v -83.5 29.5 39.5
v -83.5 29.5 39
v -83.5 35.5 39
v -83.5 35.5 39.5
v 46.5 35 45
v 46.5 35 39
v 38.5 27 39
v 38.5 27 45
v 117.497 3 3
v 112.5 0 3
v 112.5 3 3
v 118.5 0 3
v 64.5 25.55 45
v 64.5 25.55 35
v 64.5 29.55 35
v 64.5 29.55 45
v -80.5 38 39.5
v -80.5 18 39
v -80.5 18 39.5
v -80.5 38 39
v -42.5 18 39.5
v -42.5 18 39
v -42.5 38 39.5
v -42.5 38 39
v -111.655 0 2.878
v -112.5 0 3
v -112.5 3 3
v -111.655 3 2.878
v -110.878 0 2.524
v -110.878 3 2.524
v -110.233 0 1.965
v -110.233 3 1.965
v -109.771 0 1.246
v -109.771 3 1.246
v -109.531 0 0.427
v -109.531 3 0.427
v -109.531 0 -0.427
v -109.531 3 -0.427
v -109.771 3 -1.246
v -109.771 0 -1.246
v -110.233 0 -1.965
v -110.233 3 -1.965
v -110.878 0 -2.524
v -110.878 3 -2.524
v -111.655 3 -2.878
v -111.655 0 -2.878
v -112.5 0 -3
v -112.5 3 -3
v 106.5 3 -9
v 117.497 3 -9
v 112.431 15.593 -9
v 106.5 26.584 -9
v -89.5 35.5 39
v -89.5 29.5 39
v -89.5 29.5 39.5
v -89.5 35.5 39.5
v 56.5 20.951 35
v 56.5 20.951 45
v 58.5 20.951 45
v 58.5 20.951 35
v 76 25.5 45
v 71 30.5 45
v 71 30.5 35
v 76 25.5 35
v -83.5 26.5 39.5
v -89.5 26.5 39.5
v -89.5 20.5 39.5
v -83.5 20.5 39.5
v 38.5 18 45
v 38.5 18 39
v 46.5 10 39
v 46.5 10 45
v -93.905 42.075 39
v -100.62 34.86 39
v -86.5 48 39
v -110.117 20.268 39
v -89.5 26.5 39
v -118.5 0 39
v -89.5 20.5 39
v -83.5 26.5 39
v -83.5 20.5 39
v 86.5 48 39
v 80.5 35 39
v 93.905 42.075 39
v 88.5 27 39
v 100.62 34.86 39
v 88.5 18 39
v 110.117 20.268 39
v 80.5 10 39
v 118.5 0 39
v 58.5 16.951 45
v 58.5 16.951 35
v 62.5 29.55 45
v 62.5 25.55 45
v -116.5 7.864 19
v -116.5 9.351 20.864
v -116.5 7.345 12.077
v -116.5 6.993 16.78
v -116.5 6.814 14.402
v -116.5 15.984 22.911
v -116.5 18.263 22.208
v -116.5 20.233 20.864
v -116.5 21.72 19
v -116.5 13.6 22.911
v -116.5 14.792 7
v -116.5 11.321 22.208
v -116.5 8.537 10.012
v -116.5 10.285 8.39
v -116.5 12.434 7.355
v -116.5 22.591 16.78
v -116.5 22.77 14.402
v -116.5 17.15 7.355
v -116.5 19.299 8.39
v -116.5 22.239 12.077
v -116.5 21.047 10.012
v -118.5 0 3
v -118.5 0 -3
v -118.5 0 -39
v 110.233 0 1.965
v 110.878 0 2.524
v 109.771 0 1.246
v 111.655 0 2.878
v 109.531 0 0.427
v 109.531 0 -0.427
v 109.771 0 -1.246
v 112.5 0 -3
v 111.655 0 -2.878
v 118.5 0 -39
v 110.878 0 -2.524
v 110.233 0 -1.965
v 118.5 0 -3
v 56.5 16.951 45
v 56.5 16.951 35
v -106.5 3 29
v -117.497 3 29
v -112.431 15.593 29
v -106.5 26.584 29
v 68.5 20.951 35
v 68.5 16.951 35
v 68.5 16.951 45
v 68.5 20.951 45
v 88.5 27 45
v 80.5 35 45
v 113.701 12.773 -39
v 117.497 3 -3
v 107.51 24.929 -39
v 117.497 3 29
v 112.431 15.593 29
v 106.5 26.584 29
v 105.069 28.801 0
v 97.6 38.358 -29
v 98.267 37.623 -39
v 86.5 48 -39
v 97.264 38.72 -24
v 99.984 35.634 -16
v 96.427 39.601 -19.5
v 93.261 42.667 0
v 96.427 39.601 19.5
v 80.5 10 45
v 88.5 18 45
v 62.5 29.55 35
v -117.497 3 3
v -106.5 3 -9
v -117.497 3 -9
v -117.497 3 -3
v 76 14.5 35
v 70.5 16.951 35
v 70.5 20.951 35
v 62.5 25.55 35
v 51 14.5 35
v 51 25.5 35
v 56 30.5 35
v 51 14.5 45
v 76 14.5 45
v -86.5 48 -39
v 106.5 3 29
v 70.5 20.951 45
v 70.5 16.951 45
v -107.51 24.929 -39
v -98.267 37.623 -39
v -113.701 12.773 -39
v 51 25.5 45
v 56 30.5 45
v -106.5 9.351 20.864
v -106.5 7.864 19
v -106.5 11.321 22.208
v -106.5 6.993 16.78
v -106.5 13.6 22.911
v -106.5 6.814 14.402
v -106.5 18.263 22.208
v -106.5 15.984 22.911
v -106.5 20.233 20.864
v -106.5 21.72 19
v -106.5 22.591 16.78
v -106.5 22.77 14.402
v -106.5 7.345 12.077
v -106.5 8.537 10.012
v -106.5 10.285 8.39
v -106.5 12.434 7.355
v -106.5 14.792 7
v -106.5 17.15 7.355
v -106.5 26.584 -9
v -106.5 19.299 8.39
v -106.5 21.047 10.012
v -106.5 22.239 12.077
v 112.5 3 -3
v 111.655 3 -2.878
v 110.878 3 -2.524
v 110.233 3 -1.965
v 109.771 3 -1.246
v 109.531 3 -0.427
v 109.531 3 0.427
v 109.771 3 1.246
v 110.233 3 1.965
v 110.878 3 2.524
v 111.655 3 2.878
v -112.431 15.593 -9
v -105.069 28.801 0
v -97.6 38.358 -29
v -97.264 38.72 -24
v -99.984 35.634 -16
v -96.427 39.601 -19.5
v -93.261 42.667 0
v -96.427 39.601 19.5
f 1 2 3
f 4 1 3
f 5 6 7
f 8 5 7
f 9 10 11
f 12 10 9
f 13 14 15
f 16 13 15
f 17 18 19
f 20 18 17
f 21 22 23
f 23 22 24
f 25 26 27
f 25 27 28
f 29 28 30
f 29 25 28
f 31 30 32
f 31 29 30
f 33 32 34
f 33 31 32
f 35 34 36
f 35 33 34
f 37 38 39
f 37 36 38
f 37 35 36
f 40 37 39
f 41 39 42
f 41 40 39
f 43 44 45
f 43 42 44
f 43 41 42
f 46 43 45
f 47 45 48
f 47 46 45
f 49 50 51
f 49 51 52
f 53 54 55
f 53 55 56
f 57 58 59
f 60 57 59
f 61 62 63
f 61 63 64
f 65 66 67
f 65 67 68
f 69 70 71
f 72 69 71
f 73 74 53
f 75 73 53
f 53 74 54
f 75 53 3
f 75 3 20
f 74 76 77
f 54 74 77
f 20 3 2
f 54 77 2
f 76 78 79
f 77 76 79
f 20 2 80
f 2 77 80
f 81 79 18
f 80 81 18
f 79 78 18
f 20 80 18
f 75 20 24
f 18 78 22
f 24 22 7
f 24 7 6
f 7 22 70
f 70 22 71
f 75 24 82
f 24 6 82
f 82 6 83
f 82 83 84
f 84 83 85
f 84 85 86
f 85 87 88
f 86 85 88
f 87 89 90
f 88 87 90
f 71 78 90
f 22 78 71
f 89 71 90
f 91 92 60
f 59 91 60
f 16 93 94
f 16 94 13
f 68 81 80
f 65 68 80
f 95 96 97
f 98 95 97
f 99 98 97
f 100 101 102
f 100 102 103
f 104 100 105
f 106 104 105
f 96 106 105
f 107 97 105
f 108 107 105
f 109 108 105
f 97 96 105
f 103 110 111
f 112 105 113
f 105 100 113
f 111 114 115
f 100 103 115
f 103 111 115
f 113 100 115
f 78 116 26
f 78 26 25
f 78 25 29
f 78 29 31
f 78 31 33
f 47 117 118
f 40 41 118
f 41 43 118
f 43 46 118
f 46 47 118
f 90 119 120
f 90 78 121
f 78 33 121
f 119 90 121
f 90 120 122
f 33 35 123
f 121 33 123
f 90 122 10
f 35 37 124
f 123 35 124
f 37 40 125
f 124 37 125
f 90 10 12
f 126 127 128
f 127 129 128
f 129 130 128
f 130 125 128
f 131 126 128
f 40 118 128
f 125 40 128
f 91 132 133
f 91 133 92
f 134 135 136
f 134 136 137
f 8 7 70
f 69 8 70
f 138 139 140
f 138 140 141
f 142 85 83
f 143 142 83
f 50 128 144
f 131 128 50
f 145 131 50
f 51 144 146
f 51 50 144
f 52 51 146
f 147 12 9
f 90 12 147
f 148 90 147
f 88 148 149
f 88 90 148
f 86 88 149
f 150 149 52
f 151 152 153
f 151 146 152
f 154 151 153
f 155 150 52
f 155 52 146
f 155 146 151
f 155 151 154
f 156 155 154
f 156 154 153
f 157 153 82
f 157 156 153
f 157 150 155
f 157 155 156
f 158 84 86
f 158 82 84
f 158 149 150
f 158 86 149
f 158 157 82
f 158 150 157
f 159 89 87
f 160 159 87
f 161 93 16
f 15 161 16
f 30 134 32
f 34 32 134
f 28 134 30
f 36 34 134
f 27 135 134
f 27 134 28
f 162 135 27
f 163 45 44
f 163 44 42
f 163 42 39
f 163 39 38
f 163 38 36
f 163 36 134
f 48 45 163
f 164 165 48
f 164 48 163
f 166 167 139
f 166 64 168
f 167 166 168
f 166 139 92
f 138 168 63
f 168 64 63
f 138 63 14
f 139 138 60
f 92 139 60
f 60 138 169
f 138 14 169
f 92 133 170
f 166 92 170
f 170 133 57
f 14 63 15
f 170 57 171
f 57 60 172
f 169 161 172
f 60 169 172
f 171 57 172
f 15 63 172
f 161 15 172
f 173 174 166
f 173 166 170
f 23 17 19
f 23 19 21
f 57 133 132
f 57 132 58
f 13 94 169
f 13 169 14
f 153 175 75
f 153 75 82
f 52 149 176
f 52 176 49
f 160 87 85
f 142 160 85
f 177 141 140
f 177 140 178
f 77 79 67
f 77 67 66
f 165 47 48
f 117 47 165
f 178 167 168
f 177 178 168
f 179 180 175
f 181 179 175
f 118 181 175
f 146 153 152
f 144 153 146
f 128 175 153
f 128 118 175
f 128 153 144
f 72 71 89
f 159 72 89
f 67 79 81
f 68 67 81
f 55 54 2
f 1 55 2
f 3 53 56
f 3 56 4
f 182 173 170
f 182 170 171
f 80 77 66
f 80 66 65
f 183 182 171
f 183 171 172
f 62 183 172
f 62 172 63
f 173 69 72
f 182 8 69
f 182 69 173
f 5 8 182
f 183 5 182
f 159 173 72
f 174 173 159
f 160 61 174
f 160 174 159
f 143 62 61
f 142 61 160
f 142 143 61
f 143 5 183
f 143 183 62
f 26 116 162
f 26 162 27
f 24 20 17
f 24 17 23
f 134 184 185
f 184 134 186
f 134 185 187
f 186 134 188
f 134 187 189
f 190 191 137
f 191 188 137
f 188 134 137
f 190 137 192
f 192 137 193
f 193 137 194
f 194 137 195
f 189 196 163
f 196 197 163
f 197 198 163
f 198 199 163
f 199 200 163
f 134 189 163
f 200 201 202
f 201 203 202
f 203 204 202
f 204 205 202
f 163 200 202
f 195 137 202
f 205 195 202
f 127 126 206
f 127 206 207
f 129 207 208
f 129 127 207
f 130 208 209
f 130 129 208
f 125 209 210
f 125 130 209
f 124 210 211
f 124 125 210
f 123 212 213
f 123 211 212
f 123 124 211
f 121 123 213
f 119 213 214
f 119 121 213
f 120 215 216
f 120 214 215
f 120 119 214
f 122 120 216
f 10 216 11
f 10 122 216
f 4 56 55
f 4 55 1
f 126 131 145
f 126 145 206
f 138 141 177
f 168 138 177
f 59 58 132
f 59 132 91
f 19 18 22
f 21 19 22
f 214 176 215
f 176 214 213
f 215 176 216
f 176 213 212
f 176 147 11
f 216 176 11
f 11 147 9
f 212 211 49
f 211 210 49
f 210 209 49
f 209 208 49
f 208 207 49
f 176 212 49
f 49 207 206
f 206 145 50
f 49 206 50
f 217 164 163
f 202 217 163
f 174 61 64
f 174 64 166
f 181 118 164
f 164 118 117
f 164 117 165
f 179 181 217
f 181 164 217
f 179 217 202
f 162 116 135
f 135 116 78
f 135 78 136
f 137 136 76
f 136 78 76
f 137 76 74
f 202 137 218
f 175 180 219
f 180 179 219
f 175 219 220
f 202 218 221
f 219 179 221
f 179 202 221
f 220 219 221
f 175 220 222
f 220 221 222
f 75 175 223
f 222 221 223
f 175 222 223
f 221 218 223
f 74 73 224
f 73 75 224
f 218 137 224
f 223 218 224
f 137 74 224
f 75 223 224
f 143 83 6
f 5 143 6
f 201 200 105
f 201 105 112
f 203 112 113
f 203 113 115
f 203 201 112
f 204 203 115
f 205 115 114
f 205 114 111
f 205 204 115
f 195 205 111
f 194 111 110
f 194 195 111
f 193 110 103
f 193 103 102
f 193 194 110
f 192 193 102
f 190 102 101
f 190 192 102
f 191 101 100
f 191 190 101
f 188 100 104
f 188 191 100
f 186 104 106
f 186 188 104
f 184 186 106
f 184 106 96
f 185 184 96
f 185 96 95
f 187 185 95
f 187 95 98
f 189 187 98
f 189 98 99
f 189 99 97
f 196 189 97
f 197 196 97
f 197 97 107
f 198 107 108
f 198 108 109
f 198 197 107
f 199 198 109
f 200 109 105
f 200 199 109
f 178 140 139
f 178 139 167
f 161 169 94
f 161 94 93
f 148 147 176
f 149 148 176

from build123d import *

# Parameters (mm, degrees)
SKETCH1_W           = 237
SKETCH1_H           = 78
BOSS_EXTRUDE1_DEPTH = 48
SKETCH2_W           = 38
SKETCH2_H           = 30
CUT_EXTRUDE1_DEPTH  = 12
CUT_EXTRUDE2_DEPTH  = 150.767319533
SKETCH4_R           = 8
BOSS_EXTRUDE2_DEPTH = 10
BOSS_EXTRUDE3_DEPTH = 6
CUT_EXTRUDE3_DEPTH  = 10
SKETCH7_W           = 2
SKETCH7_H           = 4
BOSS_EXTRUDE4_DEPTH = 10
SKETCH8_W           = 38
SKETCH8_H           = 20
SKETCH8_W_2         = 6
SKETCH8_H_2         = 6
BOSS_EXTRUDE5_DEPTH = 0.5
CUT_EXTRUDE4_DEPTH  = 136.540584451


with BuildPart() as part:
    # Sketch1 → Boss-Extrude1 (new body)
    with BuildSketch(Plane(origin=(0, 0, 0), x_dir=(1, 0, 0), z_dir=(0, 1, 0))):
        Rectangle(SKETCH1_W, SKETCH1_H)
    extrude(amount=BOSS_EXTRUDE1_DEPTH)

    # Sketch2 → Cut-Extrude1 (cut)
    with BuildSketch(Plane(origin=(118.5, 0, 0), x_dir=(0, 0, -1), z_dir=(1, 0, 0))):
        with Locations((-10, 18)):
            Rectangle(SKETCH2_W, SKETCH2_H)
    cut_extrude1 = extrude(amount=-CUT_EXTRUDE1_DEPTH, mode=Mode.SUBTRACT)

    # Sketch3 → Cut-Extrude2 (cut, through all)
    with BuildSketch(Plane.XY.offset(39)):
        with BuildLine():
            Line((118.5, 0), (133.818434768, 0))
            Line((133.818434768, 0), (133.818434768, 98.676655982))
            Line((133.818434768, 98.676655982), (0, 98.676655982))
            Line((0, 98.676655982), (0, 48))
            add(Edge.make_bspline(
                [(118.5, 0), (91.353626717, 83.98617523), (0, 48)],
                knots=[0, 0, 0, 1, 1, 1], degree=2))
        make_face()
    cut_extrude2 = extrude(amount=-CUT_EXTRUDE2_DEPTH, mode=Mode.SUBTRACT)

    # Mirror1: Cut-Extrude1, Cut-Extrude2 across plane
    add(cut_extrude1.mirror(Plane(origin=(0, 0, 0), x_dir=(0, 0, 1), z_dir=(1, 0, 0))), mode=Mode.SUBTRACT)
    add(cut_extrude2.mirror(Plane(origin=(0, 0, 0), x_dir=(0, 0, 1), z_dir=(1, 0, 0))), mode=Mode.SUBTRACT)

    # Sketch4 → Boss-Extrude2 (add)
    with BuildSketch(Plane(origin=(-106.5, 0, 0), x_dir=(0, 0, -1), z_dir=(1, 0, 0))):
        with Locations((-15, 14.792033804)):
            Circle(SKETCH4_R)
    extrude(amount=-BOSS_EXTRUDE2_DEPTH)

    # Sketch5 → Boss-Extrude3 (add)
    with BuildSketch(Plane.XY.offset(39)):
        Polygon((46.5, 35), (38.5, 27), (38.5, 18), (46.5, 10), (80.5, 10), (88.5, 18), (88.5, 27), (80.5, 35), align=None)
    extrude(amount=BOSS_EXTRUDE3_DEPTH)

    # Sketch6 → Cut-Extrude3 (cut)
    with BuildSketch(Plane.XY.offset(45)):
        Polygon((51, 25.5), (56, 30.5), (71, 30.5), (76, 25.5), (76, 14.5), (51, 14.5), align=None)
    extrude(amount=-CUT_EXTRUDE3_DEPTH, mode=Mode.SUBTRACT)

    # Sketch7 → Boss-Extrude4 (add)
    with BuildSketch(Plane.XY.offset(35)):
        with Locations((63.5, 27.549695856)):
            Rectangle(SKETCH7_W, SKETCH7_H)
        with Locations((57.5, 18.950949538)):
            Rectangle(SKETCH7_W, SKETCH7_H)
        with Locations((69.5, 18.950949538)):
            Rectangle(SKETCH7_W, SKETCH7_H)
    extrude(amount=BOSS_EXTRUDE4_DEPTH)

    # Sketch8 → Boss-Extrude5 (add)
    with BuildSketch(Plane.XY.offset(39)):
        with Locations((-61.5, 28)):
            Rectangle(SKETCH8_W, SKETCH8_H)
        with Locations((-86.5, 23.5)):
            Rectangle(SKETCH8_W_2, SKETCH8_H_2)
        with Locations((-86.5, 32.5)):
            Rectangle(SKETCH8_W_2, SKETCH8_H_2)
    extrude(amount=BOSS_EXTRUDE5_DEPTH)

    # Sketch9 → Cut-Extrude4 (cut, through all)
    with BuildSketch(Plane.XZ):
        with BuildLine():
            Line((-112.5, -3), (-118.5, -3))
            Line((-118.5, -3), (-118.5, 3))
            Line((-118.5, 3), (-112.5, 3))
            ThreePointArc((-112.5, 3), (-109.5, 0), (-112.5, -3))
        make_face()
        with BuildLine():
            Line((118.5, 3), (118.5, -3))
            Line((118.5, -3), (112.5, -3))
            ThreePointArc((112.5, -3), (109.5, 0), (112.5, 3))
            Line((112.5, 3), (118.5, 3))
        make_face()
    extrude(amount=-CUT_EXTRUDE4_DEPTH, mode=Mode.SUBTRACT)


solid = part.part
